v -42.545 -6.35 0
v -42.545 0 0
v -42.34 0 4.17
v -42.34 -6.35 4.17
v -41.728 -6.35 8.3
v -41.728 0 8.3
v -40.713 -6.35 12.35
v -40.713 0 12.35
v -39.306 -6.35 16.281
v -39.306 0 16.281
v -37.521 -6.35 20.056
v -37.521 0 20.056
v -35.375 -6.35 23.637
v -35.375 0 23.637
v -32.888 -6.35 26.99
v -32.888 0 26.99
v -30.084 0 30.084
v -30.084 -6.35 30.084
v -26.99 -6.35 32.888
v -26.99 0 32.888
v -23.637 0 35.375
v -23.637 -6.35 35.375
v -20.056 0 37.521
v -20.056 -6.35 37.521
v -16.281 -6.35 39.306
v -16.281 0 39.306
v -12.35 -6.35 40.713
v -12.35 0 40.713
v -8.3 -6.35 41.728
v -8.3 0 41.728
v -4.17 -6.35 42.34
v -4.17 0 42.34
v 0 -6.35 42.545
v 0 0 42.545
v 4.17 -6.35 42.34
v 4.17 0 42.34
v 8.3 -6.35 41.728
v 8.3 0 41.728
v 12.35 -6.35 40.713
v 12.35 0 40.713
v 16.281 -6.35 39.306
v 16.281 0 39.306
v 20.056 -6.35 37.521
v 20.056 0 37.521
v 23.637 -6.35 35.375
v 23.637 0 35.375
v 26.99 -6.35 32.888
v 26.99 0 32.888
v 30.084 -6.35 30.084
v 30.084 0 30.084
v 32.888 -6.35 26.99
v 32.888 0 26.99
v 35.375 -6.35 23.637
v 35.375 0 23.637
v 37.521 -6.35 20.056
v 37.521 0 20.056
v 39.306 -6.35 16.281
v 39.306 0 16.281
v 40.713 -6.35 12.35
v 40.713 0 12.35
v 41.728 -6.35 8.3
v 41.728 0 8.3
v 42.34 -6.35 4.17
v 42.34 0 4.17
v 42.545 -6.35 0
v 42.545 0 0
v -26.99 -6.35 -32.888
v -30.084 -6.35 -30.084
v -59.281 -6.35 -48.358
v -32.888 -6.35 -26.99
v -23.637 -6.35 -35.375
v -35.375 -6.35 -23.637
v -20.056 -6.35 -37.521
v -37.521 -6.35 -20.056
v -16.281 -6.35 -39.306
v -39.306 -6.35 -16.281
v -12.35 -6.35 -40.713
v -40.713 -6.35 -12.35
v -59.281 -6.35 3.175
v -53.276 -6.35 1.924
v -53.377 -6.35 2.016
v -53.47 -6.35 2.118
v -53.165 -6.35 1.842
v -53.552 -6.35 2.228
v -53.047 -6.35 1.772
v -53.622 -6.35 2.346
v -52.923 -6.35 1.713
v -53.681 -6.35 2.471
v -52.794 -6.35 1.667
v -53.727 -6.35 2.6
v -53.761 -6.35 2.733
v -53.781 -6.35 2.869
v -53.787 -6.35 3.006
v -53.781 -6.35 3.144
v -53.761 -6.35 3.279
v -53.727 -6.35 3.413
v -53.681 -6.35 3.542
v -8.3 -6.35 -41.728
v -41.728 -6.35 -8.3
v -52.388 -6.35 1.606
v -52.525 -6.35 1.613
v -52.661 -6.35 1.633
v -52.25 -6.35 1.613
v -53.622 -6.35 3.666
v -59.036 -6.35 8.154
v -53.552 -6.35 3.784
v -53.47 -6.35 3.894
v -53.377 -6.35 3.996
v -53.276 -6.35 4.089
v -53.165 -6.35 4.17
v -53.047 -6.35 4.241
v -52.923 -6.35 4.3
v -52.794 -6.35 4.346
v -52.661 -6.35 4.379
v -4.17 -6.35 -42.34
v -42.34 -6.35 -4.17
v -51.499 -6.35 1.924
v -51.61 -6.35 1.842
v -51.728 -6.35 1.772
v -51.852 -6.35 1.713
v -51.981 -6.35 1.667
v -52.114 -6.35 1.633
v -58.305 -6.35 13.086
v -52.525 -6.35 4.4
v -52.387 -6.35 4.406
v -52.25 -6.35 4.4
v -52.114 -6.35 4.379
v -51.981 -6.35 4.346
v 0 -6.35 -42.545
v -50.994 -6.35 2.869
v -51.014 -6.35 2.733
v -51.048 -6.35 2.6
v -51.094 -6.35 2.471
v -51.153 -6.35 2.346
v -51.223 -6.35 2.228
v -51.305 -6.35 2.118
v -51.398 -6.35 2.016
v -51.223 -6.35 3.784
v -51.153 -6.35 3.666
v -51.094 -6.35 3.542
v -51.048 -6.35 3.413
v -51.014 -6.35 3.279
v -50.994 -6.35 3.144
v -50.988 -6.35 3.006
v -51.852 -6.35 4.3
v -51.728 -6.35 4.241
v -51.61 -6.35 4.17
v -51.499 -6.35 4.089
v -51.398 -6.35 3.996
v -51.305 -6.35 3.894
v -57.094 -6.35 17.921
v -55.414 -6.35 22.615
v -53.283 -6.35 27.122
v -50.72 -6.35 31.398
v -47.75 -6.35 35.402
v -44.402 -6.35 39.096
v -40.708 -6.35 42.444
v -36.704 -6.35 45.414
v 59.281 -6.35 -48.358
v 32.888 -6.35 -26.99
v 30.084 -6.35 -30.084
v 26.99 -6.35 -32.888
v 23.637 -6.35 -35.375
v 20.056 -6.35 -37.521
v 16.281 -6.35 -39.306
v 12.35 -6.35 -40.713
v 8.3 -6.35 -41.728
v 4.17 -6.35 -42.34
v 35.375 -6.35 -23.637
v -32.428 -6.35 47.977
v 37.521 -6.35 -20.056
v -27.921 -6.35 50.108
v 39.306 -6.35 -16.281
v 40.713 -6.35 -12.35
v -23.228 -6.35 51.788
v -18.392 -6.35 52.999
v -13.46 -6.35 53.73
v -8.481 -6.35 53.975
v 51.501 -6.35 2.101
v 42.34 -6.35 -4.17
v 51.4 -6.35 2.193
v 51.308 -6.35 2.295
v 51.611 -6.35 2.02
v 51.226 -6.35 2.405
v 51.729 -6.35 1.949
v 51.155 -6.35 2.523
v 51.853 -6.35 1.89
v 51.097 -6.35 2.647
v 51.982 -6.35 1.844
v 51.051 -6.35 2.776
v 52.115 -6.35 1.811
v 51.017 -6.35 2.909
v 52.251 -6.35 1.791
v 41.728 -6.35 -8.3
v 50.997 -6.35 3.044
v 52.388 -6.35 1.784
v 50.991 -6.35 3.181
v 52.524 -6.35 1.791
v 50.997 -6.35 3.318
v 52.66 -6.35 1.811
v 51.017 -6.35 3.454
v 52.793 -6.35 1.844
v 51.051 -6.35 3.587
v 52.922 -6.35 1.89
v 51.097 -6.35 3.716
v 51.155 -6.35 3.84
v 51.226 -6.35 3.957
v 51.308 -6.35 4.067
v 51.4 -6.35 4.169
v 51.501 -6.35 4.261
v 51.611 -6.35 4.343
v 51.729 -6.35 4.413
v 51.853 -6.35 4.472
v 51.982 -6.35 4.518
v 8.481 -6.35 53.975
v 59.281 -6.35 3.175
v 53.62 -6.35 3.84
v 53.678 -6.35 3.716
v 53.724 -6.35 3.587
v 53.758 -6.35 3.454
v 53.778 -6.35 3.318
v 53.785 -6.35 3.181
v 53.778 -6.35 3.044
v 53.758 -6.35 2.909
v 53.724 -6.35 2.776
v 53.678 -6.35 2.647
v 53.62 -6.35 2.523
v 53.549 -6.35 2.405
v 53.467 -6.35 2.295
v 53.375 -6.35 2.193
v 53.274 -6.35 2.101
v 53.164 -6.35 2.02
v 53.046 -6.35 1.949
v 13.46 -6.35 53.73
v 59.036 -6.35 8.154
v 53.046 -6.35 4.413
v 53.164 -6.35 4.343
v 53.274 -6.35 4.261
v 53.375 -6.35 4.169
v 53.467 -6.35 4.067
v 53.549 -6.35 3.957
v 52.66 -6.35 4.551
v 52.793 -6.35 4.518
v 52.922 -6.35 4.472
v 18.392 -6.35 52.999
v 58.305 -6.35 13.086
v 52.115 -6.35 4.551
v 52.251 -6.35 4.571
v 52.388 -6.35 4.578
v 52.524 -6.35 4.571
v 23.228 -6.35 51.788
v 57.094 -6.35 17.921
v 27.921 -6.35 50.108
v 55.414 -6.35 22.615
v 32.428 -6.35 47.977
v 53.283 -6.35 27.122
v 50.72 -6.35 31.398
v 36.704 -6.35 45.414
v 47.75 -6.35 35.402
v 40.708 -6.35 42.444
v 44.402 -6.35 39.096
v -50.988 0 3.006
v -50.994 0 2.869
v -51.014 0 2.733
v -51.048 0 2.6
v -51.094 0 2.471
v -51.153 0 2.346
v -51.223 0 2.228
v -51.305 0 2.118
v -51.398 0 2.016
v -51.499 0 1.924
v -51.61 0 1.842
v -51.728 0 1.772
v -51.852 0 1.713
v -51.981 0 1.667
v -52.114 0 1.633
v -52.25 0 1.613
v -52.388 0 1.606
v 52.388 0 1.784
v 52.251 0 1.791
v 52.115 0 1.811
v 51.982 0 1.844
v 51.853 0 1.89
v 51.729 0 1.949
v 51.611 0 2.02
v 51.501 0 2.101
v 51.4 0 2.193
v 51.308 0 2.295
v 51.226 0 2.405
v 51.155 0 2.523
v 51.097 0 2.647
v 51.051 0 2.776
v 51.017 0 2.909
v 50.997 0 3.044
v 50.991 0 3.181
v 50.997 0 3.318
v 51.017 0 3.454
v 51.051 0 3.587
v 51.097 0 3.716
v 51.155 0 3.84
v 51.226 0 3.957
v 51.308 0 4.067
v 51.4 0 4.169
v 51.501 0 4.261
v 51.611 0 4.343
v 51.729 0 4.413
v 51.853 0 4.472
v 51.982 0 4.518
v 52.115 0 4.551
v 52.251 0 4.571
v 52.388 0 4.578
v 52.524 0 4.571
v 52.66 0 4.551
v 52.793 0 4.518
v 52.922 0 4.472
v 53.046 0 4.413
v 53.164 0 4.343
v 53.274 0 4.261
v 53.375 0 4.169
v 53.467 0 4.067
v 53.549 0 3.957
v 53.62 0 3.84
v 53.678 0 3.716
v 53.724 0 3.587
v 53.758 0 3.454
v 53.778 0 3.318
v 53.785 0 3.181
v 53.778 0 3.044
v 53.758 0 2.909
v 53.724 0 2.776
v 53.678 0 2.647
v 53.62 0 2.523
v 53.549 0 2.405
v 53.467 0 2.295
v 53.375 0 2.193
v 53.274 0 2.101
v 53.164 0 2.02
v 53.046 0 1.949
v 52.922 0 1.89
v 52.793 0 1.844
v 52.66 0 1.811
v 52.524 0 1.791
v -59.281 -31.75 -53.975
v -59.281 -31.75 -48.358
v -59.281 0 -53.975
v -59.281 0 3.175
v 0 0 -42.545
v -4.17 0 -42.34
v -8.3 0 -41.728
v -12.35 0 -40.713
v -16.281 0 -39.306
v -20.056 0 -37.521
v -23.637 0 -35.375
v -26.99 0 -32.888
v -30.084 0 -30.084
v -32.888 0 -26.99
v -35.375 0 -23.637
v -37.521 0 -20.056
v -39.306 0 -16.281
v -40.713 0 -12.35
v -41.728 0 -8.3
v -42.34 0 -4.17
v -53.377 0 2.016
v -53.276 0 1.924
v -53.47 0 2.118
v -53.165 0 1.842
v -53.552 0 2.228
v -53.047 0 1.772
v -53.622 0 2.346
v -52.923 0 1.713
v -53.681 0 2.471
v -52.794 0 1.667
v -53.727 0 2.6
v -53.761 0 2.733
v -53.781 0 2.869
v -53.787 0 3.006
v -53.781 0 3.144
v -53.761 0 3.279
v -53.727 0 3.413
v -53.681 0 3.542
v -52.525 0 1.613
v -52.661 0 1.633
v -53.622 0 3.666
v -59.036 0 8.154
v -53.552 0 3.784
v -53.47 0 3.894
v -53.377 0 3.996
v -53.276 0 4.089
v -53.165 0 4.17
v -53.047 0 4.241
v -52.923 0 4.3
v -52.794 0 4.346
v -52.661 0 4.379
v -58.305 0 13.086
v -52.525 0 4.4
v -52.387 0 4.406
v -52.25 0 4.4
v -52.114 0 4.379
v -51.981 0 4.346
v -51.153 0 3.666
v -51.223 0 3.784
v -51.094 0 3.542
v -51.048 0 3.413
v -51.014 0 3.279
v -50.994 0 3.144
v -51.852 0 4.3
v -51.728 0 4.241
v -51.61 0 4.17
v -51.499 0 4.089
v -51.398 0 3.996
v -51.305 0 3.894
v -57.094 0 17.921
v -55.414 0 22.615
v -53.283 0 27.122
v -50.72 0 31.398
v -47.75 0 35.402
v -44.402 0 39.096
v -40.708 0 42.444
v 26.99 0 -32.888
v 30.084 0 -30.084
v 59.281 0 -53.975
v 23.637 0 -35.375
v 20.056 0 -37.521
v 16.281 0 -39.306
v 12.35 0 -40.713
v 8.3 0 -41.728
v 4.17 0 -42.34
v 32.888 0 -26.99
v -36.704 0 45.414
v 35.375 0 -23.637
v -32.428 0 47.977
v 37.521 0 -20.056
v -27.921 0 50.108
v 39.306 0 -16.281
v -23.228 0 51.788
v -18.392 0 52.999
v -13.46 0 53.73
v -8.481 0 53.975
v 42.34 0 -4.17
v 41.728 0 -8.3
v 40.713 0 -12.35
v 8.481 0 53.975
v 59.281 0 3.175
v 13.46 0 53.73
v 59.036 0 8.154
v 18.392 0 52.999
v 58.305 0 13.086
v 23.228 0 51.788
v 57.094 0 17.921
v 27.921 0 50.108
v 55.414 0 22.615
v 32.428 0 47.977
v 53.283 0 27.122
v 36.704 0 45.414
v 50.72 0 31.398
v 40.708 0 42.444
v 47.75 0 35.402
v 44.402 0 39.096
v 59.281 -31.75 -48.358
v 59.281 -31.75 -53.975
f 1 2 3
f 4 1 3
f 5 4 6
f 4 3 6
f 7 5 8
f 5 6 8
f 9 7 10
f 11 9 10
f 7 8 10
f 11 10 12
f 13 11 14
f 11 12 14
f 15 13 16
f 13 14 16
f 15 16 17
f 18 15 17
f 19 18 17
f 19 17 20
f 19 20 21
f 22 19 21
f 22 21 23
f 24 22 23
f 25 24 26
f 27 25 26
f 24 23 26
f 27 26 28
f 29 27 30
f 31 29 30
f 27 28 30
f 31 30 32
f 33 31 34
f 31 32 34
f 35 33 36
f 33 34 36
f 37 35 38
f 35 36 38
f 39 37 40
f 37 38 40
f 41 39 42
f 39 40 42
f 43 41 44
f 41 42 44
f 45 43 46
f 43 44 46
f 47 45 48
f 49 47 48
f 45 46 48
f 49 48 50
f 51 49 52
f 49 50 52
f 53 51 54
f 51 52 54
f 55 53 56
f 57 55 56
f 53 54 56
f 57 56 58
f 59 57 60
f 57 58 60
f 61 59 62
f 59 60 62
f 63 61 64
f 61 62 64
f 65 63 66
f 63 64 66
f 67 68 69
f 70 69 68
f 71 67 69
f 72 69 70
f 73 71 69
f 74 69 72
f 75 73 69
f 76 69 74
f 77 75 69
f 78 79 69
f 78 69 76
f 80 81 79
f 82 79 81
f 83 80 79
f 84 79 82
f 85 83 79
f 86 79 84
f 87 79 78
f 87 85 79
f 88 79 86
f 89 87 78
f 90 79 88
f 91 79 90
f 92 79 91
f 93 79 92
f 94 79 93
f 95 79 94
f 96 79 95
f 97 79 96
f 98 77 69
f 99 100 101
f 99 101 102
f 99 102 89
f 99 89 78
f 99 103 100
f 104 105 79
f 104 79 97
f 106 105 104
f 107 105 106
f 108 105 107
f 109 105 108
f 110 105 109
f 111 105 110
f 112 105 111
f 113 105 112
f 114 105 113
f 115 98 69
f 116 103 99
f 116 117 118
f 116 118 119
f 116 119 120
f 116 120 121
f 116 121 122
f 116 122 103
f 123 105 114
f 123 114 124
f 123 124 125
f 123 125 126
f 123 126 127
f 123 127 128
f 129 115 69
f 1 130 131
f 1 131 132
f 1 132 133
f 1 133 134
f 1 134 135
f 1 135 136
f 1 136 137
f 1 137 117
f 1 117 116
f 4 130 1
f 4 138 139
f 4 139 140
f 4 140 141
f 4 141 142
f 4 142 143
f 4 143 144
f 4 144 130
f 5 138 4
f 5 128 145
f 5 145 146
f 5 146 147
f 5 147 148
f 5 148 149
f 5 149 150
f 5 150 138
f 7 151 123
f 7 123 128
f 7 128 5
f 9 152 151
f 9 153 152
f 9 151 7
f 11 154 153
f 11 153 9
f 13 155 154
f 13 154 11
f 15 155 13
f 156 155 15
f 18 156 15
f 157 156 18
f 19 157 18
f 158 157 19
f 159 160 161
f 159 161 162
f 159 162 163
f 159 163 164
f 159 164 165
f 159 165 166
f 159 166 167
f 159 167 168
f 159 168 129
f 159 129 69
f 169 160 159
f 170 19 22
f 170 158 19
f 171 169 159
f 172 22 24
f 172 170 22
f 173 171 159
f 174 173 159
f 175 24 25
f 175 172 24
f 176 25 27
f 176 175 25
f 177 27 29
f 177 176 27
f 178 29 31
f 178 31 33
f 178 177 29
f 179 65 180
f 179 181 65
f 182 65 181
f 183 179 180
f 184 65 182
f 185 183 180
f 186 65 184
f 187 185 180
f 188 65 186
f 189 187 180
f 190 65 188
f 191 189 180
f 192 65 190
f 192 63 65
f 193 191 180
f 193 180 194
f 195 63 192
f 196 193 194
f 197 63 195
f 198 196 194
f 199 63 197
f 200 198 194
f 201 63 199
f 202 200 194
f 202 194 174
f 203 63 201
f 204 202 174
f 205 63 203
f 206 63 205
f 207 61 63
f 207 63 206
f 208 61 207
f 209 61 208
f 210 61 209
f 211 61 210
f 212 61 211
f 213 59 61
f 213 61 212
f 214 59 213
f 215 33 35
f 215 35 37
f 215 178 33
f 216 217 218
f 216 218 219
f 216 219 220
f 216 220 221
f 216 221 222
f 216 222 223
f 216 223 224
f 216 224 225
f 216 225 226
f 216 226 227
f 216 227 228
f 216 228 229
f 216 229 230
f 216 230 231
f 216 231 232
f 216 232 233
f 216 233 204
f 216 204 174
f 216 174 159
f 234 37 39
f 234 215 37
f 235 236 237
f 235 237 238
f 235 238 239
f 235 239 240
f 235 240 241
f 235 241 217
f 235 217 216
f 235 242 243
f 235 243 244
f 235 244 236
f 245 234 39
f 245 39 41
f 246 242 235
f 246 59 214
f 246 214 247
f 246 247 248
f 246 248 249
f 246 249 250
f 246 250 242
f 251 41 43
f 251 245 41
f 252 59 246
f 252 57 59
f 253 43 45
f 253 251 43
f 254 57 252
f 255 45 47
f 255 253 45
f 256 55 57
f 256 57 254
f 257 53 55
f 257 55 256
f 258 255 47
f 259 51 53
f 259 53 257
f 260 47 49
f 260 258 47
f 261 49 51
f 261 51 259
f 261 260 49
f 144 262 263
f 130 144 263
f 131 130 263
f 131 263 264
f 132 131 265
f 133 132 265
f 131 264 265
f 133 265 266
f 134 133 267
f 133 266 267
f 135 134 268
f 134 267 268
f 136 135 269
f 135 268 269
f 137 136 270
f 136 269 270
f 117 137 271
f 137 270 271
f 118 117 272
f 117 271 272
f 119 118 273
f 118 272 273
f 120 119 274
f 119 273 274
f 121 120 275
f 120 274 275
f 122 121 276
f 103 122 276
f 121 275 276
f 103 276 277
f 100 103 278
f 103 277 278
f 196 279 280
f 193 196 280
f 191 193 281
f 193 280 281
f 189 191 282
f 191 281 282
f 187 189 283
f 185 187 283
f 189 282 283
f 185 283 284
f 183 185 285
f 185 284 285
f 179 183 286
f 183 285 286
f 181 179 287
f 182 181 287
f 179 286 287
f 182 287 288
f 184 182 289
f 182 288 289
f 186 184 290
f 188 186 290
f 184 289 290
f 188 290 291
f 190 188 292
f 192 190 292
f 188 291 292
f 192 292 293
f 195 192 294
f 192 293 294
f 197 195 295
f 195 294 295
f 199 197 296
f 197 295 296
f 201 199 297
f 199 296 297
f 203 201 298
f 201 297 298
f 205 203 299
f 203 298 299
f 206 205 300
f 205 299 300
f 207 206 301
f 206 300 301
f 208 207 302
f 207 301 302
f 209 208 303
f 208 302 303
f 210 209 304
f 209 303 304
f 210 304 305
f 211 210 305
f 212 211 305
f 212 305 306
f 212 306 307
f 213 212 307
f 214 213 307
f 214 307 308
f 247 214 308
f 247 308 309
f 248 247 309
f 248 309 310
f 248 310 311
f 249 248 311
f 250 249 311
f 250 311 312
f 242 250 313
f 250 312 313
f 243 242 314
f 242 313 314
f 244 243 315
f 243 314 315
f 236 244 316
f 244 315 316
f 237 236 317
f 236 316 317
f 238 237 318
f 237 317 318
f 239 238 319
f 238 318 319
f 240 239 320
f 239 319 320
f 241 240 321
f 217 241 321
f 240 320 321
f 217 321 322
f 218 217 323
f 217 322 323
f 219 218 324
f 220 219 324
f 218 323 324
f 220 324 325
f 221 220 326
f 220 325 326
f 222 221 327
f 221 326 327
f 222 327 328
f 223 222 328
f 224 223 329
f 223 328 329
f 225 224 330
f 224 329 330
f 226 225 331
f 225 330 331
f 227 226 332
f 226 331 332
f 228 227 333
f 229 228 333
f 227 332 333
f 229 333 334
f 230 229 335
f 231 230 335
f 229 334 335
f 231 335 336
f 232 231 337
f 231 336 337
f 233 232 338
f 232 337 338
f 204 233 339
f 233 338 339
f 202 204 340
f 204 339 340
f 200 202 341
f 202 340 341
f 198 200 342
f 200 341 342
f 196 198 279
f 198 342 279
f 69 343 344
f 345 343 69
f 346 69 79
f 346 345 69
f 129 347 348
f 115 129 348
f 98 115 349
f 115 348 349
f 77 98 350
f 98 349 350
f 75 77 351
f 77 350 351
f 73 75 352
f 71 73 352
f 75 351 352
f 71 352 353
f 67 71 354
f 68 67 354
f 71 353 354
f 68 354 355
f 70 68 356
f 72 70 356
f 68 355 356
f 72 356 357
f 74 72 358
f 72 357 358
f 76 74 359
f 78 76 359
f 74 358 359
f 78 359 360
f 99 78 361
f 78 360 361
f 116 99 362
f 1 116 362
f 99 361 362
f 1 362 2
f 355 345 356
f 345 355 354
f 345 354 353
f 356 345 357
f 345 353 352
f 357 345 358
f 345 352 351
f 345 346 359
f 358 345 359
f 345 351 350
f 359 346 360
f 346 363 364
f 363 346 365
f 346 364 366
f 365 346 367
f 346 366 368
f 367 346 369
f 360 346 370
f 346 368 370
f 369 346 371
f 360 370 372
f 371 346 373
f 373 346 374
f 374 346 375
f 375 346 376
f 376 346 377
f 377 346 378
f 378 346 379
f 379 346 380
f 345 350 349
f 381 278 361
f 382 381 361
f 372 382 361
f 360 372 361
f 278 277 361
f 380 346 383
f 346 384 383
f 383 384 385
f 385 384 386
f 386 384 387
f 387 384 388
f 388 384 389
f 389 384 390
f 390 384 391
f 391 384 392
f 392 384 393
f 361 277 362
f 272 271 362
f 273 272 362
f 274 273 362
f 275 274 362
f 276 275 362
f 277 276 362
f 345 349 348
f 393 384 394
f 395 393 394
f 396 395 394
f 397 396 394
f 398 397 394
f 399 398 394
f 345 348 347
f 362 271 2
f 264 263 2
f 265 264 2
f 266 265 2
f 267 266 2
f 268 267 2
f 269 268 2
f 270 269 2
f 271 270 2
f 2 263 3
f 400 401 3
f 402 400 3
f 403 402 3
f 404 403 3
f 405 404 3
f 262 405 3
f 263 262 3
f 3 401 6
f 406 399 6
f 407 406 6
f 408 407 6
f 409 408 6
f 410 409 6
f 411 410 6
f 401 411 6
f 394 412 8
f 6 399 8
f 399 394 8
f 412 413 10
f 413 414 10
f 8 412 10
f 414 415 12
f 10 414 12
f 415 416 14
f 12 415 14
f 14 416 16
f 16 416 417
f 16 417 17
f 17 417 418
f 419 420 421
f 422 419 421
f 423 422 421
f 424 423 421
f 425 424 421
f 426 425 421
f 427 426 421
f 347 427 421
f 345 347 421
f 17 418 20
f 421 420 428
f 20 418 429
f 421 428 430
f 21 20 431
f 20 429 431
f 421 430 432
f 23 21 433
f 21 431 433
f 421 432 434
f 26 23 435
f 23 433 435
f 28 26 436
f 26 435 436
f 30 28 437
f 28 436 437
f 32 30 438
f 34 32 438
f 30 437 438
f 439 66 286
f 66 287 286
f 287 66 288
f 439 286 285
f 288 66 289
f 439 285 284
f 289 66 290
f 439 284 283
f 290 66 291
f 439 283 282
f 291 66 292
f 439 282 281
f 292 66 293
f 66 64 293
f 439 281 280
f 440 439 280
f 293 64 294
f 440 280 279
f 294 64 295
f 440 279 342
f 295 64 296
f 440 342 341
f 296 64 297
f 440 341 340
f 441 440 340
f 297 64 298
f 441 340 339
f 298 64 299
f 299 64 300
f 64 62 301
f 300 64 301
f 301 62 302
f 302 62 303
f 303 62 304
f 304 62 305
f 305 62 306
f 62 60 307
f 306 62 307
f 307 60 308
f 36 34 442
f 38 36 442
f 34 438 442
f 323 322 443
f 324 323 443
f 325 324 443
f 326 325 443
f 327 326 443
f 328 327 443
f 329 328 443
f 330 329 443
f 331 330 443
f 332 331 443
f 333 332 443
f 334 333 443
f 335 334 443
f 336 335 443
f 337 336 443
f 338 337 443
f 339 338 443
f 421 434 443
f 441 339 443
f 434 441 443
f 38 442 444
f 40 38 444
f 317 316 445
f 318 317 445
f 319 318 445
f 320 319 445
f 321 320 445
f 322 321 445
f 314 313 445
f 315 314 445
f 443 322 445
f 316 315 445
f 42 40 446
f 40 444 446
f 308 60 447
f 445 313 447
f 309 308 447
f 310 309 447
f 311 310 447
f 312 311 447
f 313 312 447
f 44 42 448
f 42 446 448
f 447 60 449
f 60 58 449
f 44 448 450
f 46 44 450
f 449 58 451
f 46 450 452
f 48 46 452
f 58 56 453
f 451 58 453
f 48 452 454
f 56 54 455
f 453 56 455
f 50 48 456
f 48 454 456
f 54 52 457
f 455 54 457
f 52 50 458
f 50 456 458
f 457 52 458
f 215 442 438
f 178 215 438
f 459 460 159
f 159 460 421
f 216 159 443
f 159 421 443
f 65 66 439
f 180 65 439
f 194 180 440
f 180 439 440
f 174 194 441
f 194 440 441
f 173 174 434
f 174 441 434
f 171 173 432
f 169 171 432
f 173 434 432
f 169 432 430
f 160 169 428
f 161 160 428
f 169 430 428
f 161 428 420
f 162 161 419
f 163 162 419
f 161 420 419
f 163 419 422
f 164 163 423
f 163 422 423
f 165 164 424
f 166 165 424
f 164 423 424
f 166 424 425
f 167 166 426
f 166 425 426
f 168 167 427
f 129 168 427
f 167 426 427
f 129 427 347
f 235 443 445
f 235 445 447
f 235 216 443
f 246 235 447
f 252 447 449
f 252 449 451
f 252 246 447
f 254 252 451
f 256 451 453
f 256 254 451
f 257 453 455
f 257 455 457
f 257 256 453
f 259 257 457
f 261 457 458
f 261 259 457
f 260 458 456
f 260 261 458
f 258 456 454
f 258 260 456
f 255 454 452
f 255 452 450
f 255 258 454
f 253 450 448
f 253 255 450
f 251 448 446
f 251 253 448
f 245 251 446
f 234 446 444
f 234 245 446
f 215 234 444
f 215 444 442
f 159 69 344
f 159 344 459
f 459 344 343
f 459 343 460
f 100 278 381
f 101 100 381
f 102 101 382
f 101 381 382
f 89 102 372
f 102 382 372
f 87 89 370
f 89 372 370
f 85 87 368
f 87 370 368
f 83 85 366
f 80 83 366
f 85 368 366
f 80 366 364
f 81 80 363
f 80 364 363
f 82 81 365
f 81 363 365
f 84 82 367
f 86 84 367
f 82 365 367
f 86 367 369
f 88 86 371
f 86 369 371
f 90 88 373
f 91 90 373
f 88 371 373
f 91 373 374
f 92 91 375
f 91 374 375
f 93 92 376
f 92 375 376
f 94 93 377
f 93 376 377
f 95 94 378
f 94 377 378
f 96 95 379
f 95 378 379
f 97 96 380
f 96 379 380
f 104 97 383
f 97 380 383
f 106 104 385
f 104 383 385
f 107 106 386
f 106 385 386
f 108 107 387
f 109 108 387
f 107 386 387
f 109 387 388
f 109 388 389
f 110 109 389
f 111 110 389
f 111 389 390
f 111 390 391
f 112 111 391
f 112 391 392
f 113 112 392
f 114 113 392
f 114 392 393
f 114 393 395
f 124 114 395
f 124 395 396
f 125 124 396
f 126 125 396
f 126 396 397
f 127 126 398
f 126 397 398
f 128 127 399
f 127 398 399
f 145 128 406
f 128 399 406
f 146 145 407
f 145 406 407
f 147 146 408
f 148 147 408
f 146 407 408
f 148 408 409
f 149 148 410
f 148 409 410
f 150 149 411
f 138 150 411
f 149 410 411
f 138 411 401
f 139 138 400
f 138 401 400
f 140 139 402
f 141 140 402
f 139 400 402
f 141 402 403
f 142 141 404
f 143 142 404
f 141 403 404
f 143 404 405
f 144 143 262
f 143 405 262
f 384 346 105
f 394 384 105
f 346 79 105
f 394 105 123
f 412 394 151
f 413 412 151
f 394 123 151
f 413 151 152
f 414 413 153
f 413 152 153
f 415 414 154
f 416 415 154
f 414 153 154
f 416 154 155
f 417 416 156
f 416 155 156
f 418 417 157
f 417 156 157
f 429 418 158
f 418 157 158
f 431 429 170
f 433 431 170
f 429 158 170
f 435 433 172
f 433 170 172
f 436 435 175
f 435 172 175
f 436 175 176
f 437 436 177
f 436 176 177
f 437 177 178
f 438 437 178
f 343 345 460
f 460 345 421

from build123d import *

# Parameters (mm, degrees)
F1_DEPTH = 6.35
F2_R     = 50.8
F3_W     = 118.5620874166
F3_H     = 5.6165596008
F4_DEPTH = 25.4


with BuildPart() as f1:
    # F0 (on Front) → F1 (new body)
    with BuildSketch(Plane.XZ):
        Polygon((-59.2810437083, -53.975), (0, -53.975), (59.2810437083, -53.975), (59.2810437083, 53.975), (-59.2810437083, 53.975), align=None)
        with BuildLine():
            ThreePointArc((-50.9875, 3.0062948354), (-51.3975505063, 2.0163453417), (-52.3875, 1.6062948354))
            ThreePointArc((-52.3875, 1.6062948354), (-53.3774494937, 3.996244329), (-50.9875, 3.0062948354))
        make_face(mode=Mode.SUBTRACT)
        with BuildLine():
            ThreePointArc((-42.545, 0), (0, 42.545), (42.545, 0))
            ThreePointArc((42.545, 0), (30.0838580056, -30.0838580056), (0, -42.545))
            ThreePointArc((0, -42.545), (-30.0838580056, -30.0838580056), (-42.545, 0))
        make_face(mode=Mode.SUBTRACT)
        with BuildLine():
            ThreePointArc((53.7845, 3.1811562367), (53.3753281733, 2.1933280634), (52.3875, 1.7841562367))
            ThreePointArc((52.3875, 1.7841562367), (51.3996718267, 4.16898441), (53.7845, 3.1811562367))
        make_face(mode=Mode.SUBTRACT)
    extrude(amount=F1_DEPTH)

    # F2
    f2_edges = [f1.edges().sort_by_distance(p)[0] for p in [
        (59.281044, -3.175, 53.975),
        (-59.281044, -3.175, 53.975),
    ]]
    fillet(f2_edges, radius=F2_R)

    # F3 (on face) → F4 (join)
    with BuildSketch(Plane.XZ.offset(6.35)):
        with Locations((0, -51.1667201996)):
            Rectangle(F3_W, F3_H)
    extrude(amount=F4_DEPTH)


solid = f1.part
